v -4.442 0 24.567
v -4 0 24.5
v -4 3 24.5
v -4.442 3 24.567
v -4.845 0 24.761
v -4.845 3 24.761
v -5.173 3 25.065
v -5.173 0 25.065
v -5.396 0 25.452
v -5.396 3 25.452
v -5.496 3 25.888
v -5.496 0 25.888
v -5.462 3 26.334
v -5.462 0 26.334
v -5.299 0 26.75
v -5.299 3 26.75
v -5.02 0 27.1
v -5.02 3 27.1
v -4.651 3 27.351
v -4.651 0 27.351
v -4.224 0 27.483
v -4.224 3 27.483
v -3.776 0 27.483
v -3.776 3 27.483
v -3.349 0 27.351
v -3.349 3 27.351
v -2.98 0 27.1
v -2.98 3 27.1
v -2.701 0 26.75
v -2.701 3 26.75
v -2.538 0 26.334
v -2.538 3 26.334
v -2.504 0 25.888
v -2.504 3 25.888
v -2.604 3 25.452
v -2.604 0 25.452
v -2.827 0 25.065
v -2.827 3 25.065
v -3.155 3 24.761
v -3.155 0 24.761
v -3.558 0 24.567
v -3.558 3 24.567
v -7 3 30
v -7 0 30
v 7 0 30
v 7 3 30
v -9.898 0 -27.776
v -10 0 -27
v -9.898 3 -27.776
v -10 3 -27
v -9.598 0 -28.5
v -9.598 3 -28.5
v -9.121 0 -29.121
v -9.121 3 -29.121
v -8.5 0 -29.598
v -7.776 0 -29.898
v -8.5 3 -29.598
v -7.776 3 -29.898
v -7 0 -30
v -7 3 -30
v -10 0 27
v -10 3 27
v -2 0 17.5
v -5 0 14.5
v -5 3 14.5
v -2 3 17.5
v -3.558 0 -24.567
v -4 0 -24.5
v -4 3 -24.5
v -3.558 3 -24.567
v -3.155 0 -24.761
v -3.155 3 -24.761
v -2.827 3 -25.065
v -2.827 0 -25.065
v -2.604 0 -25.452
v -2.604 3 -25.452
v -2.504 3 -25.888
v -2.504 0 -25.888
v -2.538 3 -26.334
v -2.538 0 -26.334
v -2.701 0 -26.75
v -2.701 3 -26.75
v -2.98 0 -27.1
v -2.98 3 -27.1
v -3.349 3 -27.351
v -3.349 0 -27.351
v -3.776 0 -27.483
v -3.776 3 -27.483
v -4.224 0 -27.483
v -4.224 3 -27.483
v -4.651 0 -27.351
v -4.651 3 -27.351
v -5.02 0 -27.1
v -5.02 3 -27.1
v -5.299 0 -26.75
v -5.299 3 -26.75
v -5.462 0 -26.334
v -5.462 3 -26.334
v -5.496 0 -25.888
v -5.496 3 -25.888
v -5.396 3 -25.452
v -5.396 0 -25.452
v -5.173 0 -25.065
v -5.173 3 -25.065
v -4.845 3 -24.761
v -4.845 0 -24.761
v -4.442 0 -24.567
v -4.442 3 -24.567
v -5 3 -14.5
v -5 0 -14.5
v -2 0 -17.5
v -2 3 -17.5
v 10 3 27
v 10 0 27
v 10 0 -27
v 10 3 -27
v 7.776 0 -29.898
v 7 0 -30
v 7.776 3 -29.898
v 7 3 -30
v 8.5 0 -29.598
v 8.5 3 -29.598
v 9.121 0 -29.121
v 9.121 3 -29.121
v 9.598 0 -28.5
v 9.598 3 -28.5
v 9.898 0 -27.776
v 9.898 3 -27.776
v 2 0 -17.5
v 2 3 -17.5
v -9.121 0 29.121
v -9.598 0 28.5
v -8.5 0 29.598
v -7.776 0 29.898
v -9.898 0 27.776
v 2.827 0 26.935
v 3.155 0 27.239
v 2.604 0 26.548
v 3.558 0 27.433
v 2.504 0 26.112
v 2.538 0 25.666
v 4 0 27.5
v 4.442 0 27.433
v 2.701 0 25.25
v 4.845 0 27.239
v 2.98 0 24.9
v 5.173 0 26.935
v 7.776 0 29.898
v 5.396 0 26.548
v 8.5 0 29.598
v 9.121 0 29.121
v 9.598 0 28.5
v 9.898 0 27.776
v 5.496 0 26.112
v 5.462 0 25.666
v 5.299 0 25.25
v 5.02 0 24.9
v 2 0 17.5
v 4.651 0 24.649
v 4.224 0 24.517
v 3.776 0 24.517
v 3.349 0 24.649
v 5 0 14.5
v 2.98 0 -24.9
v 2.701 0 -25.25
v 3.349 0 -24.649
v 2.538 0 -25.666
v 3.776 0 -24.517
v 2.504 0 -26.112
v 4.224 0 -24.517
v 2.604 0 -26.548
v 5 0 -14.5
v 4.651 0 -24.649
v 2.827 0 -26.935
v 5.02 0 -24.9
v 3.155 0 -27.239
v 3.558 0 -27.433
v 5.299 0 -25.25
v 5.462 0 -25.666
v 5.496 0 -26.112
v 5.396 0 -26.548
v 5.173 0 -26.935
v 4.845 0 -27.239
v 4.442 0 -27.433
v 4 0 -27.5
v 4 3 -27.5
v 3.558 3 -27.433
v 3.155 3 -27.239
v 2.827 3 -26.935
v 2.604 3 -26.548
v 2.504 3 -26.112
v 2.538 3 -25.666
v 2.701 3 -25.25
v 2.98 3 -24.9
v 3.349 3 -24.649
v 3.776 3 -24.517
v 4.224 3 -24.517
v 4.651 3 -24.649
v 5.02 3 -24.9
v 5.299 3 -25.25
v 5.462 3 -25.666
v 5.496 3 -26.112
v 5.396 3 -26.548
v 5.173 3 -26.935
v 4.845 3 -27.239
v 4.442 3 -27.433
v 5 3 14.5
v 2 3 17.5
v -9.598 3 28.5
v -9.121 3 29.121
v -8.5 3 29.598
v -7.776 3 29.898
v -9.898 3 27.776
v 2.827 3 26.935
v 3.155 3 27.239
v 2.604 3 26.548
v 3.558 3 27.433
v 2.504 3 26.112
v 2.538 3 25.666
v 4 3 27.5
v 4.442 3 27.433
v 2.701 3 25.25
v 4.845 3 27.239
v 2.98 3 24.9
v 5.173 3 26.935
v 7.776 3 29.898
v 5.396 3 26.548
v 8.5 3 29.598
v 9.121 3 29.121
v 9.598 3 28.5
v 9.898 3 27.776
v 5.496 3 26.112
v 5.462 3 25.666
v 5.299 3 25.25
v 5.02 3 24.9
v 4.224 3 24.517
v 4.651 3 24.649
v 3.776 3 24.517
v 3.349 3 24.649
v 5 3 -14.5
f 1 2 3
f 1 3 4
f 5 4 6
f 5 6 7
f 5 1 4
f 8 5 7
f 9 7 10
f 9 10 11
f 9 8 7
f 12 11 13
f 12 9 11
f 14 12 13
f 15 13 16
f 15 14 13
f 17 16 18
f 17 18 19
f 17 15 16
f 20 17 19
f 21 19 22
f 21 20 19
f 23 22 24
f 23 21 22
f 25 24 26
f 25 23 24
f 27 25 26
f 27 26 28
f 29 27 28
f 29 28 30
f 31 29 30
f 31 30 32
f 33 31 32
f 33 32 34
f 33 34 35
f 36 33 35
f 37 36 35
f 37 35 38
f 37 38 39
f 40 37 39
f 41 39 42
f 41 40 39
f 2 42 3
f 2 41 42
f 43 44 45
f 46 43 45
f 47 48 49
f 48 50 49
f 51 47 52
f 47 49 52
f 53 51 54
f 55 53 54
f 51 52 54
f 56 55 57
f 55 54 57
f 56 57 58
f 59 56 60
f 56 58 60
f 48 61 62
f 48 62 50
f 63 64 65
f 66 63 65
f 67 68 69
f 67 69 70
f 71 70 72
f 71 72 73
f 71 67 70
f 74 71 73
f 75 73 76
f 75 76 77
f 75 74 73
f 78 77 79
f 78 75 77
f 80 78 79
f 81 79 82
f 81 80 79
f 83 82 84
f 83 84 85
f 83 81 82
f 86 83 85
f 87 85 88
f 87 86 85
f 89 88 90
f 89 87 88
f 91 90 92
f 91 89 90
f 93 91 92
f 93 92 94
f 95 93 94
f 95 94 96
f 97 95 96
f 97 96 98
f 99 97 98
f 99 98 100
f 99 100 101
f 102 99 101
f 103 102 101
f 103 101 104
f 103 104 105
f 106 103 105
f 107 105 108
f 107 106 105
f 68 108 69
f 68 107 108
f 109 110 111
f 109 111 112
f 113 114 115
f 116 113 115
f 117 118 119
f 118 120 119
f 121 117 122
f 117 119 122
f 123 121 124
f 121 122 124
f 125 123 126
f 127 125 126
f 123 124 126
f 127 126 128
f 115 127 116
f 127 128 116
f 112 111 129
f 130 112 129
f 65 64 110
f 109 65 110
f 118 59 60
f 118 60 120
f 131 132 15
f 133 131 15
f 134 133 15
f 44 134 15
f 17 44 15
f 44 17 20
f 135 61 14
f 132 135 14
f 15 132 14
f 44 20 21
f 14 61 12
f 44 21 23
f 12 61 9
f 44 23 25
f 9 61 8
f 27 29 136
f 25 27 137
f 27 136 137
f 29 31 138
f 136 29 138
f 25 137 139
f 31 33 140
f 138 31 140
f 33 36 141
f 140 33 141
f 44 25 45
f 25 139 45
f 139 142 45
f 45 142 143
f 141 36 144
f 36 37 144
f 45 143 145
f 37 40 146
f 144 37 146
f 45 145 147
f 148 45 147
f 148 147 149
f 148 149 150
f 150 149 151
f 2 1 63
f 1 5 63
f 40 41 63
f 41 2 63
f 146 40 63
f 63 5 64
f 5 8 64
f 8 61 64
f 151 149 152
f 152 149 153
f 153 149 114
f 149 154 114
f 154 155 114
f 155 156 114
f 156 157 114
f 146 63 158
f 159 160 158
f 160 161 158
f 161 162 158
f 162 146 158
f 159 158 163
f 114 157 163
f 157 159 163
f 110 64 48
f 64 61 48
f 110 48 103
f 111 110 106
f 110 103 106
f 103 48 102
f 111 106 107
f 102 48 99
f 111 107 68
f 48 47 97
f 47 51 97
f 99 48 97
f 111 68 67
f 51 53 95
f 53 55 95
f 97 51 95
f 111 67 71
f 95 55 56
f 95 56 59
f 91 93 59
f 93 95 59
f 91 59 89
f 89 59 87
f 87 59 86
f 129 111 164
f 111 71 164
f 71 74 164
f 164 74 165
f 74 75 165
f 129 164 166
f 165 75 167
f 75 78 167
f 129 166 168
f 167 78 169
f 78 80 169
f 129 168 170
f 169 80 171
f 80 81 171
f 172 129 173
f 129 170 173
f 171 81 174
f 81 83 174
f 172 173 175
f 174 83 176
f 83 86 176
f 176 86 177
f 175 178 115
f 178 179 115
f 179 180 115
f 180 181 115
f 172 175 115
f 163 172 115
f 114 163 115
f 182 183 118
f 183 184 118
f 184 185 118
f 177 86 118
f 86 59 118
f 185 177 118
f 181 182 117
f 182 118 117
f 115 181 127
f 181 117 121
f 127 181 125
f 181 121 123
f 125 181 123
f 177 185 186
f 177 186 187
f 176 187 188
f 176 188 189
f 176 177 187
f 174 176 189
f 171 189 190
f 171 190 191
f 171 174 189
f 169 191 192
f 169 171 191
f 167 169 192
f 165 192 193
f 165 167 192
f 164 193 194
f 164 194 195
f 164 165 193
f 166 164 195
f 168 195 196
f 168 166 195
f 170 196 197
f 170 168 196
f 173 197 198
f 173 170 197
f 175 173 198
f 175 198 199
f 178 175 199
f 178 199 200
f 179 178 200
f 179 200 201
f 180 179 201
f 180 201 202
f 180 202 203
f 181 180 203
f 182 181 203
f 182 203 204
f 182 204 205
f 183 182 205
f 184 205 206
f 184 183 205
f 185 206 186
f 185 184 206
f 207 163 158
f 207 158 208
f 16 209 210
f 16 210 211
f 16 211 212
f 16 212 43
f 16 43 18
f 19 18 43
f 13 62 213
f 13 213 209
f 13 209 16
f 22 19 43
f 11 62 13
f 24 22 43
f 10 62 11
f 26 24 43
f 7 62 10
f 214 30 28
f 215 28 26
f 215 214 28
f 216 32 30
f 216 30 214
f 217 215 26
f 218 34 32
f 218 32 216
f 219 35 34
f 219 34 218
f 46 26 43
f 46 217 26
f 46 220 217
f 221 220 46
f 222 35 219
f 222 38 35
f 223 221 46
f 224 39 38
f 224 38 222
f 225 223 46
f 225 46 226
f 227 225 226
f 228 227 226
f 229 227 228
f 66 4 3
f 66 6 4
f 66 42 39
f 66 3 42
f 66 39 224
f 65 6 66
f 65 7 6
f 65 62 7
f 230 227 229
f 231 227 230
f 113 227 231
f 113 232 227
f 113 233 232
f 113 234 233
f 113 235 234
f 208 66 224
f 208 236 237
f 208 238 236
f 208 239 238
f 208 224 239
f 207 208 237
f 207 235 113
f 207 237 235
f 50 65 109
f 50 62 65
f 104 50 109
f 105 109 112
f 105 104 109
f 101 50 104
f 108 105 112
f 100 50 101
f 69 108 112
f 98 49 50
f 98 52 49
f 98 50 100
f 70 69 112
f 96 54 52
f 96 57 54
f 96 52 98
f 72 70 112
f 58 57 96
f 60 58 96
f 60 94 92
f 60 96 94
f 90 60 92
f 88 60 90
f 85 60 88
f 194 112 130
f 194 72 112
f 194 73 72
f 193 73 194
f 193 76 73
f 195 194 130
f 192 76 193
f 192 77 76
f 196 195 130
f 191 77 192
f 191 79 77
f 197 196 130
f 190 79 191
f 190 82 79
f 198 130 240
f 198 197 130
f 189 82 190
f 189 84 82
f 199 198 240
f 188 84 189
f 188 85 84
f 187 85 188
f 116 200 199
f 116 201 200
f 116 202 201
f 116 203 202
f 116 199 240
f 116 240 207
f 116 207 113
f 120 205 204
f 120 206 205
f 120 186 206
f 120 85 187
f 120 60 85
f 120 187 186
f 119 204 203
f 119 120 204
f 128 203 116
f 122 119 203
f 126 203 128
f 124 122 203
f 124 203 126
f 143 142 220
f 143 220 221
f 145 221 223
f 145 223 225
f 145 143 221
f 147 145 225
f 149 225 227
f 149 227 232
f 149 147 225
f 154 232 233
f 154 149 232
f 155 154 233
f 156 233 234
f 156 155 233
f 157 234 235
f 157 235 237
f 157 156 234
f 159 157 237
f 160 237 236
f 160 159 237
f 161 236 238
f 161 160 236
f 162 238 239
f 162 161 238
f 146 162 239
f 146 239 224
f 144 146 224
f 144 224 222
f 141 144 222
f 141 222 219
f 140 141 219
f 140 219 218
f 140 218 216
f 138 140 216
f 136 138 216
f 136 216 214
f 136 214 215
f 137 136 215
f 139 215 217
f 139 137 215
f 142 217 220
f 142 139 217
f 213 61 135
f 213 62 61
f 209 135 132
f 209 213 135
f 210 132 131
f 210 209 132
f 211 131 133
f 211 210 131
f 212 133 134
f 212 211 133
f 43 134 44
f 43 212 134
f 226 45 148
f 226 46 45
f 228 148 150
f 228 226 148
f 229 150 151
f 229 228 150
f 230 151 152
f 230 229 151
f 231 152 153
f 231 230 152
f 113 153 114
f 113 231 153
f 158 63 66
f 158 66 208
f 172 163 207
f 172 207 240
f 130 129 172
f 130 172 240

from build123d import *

# Parameters (mm, degrees)
SKETCH_1_W      = 20
SKETCH_1_H      = 60
SKETCH_1_R      = 1.5
SKETCH_1_W_2    = 10
SKETCH_1_H_2    = 35
EXTRUDE_1_DEPTH = 3
CHAMFER_1_SIZE  = 3
FILLET_1_R      = 3


with BuildPart() as part:
    # 草图1 → 凸台-拉伸1 (new body)
    with BuildSketch(Plane(origin=(0, 0, 0), x_dir=(1, 0, 0), z_dir=(0, 1, 0))):
        Rectangle(SKETCH_1_W, SKETCH_1_H)
        with Locations(Location((-4, 26, 0), (0, 0, 270))):
            Circle(SKETCH_1_R, mode=Mode.SUBTRACT)
        with Locations(Location((4, 26, 0), (0, 0, 90))):
            Circle(SKETCH_1_R, mode=Mode.SUBTRACT)
        with Locations(Location((4, -26, 0), (0, 0, 270))):
            Circle(SKETCH_1_R, mode=Mode.SUBTRACT)
        with Locations(Location((-4, -26, 0), (0, 0, 90))):
            Circle(SKETCH_1_R, mode=Mode.SUBTRACT)
        Rectangle(SKETCH_1_W_2, SKETCH_1_H_2, mode=Mode.SUBTRACT)
    extrude(amount=EXTRUDE_1_DEPTH)

    # 倒角1
    chamfer_1_edges = [part.edges().sort_by_distance(p)[0] for p in [
        (5, 1.5, 17.5),
        (5, 1.5, -17.5),
        (-5, 1.5, -17.5),
        (-5, 1.5, 17.5),
    ]]
    chamfer(chamfer_1_edges, length=CHAMFER_1_SIZE)

    # 圆角1
    fillet_1_edges = [part.edges().sort_by_distance(p)[0] for p in [
        (10, 1.5, 30),
        (-10, 1.5, 30),
        (-10, 1.5, -30),
        (10, 1.5, -30),
    ]]
    fillet(fillet_1_edges, radius=FILLET_1_R)


solid = part.part
